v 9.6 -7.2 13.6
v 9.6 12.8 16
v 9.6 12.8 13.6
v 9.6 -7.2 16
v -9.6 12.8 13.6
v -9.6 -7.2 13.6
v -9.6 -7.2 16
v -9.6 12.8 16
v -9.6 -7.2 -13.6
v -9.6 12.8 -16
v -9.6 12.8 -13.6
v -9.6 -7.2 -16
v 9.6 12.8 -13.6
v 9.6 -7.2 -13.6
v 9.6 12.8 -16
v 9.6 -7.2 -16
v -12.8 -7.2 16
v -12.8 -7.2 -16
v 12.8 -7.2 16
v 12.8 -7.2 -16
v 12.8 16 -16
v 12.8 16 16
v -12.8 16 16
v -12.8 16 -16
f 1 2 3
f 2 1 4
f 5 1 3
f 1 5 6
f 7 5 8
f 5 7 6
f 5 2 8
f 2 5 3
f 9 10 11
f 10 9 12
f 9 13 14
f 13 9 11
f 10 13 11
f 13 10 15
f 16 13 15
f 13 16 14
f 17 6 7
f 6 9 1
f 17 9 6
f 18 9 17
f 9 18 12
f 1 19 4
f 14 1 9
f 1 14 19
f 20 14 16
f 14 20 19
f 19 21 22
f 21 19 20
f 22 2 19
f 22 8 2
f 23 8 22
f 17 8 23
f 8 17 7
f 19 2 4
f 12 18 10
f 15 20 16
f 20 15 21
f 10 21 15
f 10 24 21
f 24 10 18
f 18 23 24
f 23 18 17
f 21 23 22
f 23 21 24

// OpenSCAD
size = 32;//block=32 //item=8



//cube([size*0.8,size*0.8,size*0.8],center=true);
difference() {
  cube([size * 0.8, size * 1, size * 1], center = true);

  union() {
    translate([0, -size * 0.375, 0]) {
      cube([size * 1 * 2, size * 0.3, size * 1 * 2], center = true);//front
    }
    ;//translate
    for(i = [0:1:2]) {//top/bottom
      rotate([180 * i, 0, 0]) {
        translate([0, 0, size * 0.5]) {
          cube([size * 0.6, size * 0.8, size * 0.15], center = true);
        }
        ;//translate
      }
      ;//rotate
    }
    ;//for
  }
  ;

}
;
